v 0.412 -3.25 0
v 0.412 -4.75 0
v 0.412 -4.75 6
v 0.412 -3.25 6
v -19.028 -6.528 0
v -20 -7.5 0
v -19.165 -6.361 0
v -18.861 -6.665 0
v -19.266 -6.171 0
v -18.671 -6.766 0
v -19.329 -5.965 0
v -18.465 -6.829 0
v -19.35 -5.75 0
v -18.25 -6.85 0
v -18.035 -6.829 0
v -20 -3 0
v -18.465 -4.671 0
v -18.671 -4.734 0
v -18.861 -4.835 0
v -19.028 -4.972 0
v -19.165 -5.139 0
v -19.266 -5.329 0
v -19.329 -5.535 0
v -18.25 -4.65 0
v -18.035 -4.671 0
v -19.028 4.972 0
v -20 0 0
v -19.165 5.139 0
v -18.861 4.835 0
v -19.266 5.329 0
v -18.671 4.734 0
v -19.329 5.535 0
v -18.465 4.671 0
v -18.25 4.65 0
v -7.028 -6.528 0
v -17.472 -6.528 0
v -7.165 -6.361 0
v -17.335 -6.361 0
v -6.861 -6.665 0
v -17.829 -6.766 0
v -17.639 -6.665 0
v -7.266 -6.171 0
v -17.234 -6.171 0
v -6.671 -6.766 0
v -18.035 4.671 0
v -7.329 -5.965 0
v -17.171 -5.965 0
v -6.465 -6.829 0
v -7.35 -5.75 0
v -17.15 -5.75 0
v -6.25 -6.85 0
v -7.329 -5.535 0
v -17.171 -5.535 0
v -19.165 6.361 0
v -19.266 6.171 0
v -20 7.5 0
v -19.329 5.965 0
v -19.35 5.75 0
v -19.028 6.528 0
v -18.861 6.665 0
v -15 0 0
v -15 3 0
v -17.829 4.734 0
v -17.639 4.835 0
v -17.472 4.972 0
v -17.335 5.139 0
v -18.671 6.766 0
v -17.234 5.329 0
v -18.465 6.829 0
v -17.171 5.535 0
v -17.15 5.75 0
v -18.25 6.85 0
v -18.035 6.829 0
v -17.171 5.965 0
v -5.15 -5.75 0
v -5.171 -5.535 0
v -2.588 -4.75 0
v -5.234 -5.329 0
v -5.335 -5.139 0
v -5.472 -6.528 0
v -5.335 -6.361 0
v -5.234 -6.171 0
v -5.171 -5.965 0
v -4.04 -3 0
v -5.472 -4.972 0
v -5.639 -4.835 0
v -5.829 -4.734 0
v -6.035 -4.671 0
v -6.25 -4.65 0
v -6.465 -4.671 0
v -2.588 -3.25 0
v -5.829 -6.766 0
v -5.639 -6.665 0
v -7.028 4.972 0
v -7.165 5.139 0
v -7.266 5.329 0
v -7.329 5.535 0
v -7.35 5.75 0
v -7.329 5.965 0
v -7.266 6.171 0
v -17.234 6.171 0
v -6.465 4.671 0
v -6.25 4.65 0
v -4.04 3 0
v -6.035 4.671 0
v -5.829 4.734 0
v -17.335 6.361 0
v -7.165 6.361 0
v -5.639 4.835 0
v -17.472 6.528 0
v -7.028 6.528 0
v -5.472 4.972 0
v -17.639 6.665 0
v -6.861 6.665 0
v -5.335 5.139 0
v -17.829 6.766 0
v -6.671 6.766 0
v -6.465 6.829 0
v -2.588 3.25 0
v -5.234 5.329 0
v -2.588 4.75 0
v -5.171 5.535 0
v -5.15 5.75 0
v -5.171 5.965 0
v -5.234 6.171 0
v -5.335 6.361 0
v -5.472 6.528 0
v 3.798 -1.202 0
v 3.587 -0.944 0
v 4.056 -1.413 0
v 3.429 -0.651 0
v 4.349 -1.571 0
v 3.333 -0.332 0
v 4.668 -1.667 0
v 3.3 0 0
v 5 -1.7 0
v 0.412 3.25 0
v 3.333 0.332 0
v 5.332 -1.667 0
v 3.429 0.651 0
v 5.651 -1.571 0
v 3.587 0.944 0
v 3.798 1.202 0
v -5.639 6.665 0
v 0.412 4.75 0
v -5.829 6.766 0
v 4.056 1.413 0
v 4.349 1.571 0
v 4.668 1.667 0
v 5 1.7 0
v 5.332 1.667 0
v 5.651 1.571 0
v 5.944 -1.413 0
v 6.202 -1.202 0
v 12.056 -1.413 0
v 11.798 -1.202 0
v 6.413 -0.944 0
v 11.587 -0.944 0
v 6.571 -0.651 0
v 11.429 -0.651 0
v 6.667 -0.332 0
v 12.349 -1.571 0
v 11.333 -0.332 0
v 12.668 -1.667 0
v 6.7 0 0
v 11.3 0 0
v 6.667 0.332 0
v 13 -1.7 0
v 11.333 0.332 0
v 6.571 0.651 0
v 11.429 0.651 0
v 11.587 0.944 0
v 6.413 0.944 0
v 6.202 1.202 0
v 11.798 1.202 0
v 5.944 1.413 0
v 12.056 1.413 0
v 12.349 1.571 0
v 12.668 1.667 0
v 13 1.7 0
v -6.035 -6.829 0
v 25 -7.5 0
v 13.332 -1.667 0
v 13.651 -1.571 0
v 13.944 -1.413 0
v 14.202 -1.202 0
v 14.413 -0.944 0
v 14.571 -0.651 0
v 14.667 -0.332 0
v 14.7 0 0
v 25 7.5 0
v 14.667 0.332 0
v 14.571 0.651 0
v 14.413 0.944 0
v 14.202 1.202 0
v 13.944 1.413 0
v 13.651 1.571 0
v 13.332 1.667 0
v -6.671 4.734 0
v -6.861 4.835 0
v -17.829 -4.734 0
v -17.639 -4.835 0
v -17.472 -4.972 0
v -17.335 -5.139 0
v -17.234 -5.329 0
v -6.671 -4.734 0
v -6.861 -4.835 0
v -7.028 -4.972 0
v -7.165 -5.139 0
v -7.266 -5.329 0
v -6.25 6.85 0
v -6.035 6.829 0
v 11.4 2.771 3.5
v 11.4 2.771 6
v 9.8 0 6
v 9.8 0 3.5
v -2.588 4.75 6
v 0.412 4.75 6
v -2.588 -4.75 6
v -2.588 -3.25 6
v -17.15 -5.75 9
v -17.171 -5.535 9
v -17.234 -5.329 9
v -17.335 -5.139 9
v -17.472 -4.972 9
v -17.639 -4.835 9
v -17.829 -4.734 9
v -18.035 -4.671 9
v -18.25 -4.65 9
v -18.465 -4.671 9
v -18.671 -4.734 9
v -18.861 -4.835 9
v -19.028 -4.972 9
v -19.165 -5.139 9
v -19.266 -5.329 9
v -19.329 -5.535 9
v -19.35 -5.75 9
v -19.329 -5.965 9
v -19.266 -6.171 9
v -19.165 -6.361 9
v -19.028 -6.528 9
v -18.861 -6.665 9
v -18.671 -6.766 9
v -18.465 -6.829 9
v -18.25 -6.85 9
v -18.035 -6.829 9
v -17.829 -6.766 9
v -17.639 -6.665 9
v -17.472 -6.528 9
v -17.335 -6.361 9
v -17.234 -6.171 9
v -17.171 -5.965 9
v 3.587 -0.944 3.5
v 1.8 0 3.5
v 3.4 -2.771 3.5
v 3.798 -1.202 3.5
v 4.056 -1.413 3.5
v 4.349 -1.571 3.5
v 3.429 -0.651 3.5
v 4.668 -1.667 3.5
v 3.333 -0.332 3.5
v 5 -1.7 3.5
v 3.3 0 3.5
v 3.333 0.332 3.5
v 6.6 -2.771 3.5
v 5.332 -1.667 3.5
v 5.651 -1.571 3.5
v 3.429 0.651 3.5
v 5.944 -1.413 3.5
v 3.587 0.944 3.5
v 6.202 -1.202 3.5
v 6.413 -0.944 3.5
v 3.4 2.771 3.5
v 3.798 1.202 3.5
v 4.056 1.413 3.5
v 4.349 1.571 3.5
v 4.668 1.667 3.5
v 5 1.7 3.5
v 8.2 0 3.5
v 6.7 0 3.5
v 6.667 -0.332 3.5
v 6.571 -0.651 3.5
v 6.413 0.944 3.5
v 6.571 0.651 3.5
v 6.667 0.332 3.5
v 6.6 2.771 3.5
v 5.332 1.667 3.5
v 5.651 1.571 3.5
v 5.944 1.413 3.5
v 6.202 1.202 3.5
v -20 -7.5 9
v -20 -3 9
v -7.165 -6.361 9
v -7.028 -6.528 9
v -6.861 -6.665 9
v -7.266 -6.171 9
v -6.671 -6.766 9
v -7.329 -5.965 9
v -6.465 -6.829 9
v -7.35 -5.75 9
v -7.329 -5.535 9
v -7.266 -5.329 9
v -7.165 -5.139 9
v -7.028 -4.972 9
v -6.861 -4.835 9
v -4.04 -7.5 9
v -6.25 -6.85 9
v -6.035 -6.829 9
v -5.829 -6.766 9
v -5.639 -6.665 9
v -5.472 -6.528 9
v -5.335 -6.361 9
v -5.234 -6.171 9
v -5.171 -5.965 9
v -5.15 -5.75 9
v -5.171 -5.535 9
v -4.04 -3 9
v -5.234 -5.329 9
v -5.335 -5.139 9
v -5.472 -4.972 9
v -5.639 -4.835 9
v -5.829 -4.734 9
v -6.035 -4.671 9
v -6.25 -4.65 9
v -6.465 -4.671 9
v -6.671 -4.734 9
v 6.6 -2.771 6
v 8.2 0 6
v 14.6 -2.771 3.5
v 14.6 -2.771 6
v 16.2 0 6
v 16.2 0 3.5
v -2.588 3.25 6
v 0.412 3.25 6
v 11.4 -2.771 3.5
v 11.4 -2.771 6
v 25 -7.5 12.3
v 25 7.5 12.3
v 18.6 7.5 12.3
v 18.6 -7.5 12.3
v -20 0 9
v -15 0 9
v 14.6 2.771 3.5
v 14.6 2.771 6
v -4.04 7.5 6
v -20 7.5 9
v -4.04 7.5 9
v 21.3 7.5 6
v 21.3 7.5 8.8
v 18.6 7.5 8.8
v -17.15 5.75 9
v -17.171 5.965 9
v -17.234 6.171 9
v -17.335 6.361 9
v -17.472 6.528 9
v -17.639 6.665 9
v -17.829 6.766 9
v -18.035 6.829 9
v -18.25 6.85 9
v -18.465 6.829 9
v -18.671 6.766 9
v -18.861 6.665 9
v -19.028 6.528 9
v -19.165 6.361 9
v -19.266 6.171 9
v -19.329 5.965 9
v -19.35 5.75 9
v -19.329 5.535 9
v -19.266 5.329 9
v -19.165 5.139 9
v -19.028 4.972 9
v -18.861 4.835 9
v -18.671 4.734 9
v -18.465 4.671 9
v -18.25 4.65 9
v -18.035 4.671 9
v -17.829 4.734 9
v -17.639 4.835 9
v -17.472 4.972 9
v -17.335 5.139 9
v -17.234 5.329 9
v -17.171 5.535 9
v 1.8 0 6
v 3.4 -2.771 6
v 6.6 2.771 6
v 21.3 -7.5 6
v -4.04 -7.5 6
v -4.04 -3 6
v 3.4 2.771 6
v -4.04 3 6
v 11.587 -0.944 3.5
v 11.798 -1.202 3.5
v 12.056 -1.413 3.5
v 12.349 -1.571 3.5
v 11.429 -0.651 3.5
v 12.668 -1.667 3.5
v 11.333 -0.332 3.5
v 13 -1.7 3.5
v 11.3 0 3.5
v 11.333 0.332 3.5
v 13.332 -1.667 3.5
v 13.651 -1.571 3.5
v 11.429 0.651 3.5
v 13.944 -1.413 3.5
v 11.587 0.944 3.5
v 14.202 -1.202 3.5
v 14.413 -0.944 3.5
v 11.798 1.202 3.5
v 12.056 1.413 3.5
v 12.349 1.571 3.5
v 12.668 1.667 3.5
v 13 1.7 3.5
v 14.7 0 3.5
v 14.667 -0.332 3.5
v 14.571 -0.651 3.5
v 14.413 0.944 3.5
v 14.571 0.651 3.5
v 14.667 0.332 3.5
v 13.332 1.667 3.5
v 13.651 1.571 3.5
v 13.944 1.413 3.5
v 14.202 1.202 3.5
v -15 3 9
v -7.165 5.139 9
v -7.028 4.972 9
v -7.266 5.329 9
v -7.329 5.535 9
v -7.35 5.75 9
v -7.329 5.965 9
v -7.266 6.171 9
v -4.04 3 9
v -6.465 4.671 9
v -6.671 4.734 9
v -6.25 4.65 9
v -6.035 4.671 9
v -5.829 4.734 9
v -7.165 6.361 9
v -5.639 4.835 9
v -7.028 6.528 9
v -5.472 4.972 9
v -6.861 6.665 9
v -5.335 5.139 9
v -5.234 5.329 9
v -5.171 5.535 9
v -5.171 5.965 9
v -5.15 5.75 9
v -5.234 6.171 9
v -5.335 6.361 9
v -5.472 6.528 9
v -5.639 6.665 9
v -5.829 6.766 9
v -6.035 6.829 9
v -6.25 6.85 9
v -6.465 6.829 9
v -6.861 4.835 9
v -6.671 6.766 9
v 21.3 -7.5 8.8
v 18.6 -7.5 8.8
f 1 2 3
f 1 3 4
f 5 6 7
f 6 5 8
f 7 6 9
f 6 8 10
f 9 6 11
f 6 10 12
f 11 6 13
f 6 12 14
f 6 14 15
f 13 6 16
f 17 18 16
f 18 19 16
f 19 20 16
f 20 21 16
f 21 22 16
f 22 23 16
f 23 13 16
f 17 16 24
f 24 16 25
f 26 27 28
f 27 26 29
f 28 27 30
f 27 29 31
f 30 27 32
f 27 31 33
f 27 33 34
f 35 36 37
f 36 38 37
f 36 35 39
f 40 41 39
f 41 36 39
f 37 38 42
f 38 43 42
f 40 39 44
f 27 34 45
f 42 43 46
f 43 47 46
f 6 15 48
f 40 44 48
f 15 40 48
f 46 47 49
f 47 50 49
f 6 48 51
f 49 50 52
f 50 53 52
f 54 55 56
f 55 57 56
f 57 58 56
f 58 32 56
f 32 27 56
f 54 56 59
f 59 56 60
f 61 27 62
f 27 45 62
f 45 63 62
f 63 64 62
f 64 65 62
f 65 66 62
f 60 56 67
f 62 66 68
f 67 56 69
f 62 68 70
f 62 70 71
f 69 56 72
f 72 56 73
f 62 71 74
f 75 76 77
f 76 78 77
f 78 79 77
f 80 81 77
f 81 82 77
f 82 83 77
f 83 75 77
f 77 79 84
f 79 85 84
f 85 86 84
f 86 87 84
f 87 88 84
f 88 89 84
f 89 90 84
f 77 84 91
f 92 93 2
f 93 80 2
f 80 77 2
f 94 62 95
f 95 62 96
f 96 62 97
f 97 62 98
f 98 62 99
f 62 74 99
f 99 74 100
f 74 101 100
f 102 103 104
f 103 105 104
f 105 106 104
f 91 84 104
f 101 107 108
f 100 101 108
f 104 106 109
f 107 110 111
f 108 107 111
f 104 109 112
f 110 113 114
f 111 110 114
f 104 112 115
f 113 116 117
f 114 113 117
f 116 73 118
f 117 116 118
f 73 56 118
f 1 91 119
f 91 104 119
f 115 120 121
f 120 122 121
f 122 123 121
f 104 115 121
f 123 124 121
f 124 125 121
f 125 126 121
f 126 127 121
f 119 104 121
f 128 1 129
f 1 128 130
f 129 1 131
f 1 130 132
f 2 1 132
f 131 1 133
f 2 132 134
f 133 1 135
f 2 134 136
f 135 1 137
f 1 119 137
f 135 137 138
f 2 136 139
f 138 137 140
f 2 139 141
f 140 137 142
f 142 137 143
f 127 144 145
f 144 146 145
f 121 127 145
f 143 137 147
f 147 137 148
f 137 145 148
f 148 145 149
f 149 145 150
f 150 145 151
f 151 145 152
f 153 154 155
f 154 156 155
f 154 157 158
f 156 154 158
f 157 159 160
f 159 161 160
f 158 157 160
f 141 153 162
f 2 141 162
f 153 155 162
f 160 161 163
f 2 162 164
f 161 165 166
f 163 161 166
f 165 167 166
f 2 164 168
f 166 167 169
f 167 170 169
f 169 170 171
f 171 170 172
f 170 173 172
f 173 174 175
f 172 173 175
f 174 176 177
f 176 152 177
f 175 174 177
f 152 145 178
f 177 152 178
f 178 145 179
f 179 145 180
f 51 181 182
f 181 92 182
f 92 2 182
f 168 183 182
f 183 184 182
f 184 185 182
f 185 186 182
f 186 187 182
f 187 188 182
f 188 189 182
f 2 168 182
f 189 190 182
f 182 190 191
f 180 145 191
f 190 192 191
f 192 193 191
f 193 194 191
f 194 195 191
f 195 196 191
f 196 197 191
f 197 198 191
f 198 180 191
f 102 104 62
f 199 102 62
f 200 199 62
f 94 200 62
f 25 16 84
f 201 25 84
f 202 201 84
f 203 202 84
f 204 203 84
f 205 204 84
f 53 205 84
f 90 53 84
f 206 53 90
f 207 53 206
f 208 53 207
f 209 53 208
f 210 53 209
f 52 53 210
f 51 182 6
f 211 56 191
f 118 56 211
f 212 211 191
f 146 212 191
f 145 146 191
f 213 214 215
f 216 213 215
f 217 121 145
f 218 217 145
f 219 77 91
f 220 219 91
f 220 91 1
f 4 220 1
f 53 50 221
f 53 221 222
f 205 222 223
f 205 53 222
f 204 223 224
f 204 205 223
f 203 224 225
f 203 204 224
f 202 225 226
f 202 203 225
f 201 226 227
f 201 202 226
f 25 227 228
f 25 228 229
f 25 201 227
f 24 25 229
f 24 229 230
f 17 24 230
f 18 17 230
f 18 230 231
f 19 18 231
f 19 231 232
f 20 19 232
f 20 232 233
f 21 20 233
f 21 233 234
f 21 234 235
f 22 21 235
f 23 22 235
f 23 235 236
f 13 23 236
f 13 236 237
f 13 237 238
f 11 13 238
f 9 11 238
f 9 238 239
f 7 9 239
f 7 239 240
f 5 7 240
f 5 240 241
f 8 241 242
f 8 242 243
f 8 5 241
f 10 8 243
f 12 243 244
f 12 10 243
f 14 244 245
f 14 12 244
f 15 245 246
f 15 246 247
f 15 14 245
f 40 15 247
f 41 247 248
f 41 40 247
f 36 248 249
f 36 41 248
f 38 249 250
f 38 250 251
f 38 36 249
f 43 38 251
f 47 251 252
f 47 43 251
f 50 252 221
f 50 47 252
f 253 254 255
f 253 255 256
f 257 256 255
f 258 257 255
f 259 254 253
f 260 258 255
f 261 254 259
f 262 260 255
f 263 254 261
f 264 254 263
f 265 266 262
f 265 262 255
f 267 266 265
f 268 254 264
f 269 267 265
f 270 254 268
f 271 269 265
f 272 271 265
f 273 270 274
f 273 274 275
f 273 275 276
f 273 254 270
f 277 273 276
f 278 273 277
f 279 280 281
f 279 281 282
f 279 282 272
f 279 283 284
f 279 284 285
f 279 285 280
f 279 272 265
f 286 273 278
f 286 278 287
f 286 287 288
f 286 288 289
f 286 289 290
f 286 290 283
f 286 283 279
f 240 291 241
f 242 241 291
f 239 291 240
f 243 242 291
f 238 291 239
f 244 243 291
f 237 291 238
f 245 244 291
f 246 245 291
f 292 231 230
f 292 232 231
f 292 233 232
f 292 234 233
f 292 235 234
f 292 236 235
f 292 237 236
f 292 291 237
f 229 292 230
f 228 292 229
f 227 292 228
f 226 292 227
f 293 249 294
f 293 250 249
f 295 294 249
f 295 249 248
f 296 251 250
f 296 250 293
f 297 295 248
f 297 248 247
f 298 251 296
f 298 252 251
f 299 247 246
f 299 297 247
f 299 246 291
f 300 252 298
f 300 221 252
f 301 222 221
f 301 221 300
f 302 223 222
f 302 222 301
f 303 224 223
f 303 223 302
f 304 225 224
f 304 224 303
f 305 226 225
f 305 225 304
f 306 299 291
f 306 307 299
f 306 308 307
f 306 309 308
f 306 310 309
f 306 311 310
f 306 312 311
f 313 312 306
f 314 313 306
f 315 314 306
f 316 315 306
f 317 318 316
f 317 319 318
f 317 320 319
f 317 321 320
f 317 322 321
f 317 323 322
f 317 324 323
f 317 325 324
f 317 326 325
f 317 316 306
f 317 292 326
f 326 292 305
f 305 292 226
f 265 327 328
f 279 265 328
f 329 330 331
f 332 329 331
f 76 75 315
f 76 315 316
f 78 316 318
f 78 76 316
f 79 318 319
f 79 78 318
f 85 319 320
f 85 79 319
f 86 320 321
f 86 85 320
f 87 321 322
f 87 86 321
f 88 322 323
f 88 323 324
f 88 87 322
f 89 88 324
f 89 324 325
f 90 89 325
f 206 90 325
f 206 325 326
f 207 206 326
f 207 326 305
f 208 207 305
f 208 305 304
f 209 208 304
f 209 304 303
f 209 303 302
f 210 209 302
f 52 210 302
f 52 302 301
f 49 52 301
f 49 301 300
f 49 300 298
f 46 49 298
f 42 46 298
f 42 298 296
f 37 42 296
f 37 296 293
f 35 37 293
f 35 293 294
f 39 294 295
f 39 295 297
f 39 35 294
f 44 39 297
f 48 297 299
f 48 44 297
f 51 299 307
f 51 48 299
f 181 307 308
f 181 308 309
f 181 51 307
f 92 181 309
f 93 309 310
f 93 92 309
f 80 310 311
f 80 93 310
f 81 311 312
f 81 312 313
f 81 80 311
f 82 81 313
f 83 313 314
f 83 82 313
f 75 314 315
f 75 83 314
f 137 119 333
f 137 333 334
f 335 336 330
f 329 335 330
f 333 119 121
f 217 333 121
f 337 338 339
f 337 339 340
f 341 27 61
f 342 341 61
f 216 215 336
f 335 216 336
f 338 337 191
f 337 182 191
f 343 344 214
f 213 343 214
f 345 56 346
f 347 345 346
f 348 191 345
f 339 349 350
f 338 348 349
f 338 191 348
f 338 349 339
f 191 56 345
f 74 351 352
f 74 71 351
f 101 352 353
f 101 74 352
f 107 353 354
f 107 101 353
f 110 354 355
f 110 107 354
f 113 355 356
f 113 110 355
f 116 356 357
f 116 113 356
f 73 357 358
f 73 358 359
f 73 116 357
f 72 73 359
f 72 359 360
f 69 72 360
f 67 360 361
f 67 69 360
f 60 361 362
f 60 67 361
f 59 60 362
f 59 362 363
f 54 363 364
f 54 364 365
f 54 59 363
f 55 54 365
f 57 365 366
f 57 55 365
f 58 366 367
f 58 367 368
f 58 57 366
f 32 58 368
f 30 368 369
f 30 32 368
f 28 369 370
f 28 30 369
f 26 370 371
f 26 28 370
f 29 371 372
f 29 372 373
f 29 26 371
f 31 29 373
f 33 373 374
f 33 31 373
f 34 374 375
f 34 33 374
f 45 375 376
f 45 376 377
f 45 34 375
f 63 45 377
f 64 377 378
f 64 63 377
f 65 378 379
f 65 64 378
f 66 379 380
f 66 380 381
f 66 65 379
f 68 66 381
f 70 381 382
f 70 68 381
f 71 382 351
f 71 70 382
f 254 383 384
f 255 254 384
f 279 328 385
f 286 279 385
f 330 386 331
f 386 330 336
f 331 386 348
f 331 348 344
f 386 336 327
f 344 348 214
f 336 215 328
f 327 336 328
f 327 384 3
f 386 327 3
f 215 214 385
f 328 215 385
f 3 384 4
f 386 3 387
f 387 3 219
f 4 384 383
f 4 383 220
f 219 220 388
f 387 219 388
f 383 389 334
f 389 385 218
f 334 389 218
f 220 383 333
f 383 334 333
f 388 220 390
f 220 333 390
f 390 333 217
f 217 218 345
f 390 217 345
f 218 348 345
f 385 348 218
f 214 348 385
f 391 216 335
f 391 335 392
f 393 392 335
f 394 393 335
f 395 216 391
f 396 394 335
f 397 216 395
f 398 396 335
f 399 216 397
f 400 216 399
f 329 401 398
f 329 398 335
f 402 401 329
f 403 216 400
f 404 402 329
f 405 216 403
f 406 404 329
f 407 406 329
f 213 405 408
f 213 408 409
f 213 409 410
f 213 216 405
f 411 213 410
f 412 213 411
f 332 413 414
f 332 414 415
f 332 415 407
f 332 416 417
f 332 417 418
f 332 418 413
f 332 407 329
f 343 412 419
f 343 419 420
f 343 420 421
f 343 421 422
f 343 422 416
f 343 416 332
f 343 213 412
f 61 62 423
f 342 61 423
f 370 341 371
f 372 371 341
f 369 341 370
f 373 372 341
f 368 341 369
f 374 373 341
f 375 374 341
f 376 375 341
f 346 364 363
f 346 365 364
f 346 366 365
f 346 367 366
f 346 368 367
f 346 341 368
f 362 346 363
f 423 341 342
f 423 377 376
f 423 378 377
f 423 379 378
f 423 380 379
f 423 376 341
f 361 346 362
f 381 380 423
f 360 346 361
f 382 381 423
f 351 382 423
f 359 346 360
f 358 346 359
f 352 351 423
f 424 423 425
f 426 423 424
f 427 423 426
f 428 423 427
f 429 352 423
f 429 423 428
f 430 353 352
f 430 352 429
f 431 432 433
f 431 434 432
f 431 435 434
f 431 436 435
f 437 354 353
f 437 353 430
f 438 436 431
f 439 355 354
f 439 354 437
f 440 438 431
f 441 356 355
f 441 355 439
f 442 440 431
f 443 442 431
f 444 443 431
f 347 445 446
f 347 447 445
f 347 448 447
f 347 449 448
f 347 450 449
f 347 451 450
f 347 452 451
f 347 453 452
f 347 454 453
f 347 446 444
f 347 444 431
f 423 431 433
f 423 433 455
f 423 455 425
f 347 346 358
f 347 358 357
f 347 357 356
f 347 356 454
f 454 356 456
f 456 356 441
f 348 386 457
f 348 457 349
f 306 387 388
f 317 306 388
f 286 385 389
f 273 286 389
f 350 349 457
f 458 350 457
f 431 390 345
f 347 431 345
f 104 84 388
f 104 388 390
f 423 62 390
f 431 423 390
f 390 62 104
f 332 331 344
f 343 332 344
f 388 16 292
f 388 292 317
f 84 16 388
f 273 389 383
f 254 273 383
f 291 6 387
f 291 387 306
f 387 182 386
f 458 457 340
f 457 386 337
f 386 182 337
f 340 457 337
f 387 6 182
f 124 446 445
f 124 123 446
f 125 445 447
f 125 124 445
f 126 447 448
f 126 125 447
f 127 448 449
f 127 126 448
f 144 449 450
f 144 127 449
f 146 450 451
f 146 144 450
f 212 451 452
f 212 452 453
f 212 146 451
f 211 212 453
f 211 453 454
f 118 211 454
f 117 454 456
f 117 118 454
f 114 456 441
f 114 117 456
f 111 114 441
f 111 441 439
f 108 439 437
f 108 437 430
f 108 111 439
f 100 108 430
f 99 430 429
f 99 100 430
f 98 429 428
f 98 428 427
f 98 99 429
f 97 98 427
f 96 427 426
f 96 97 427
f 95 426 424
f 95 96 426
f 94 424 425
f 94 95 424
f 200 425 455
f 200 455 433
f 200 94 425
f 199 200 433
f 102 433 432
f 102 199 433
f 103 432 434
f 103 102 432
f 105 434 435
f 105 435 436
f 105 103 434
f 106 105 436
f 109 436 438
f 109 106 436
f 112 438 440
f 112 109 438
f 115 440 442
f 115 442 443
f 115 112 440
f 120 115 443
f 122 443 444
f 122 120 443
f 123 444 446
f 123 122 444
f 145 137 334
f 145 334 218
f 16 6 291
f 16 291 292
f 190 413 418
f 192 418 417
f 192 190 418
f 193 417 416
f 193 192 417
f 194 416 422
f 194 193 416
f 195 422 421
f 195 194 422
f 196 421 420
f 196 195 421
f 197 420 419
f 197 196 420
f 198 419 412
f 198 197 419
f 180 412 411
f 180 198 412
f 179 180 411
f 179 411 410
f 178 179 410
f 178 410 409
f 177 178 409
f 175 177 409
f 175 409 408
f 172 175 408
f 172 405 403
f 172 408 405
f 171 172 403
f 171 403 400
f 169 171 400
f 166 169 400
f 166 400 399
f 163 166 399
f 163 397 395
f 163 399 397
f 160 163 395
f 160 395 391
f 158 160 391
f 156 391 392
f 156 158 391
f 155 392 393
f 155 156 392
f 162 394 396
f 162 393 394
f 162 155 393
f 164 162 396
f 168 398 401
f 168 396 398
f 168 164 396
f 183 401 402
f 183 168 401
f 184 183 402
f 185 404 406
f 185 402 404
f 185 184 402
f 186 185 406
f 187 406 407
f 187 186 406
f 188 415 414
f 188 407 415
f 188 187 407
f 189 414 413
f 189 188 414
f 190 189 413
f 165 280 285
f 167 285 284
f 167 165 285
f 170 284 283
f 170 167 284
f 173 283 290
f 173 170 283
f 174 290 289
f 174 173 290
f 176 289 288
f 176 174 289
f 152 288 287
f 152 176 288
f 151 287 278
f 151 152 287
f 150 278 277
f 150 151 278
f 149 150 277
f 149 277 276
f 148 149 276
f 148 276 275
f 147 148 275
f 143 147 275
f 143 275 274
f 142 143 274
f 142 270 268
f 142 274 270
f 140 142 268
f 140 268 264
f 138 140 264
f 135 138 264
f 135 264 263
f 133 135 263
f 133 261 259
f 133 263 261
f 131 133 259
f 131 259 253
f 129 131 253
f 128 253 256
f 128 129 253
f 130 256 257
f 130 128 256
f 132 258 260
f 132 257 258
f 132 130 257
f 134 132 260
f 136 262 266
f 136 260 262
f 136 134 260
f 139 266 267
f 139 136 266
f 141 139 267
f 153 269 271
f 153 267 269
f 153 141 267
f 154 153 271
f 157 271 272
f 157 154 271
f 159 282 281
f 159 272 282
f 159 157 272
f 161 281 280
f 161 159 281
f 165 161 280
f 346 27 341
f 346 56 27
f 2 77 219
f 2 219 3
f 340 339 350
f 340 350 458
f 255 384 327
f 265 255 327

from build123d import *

# Parameters (mm, degrees)
SKETCH_R     = 1.7
SKETCH_R_2   = 1.1
SKETCH_W     = 3
SKETCH_H     = 1.5
PAD_DEPTH    = 6
POCKET_DEPTH = 2.5
SKETCH002_W  = 15.96
SKETCH002_H  = 4.5
SKETCH002_R  = 1.1
PAD001_DEPTH = 3
SKETCH003_W  = 3.7
SKETCH003_H  = 15
PAD002_DEPTH = 6.3
SKETCH004_W  = 15
SKETCH004_H  = 3.5
PAD003_DEPTH = 2.7
SKETCH005_W  = 5
SKETCH005_H  = 9
PAD004_DEPTH = 3


with BuildPart() as part:
    # Sketch → Pad (new body)
    with BuildSketch(Plane.XY):
        Polygon((-20, 7.5), (25, 7.5), (25, -7.5), (-20, -7.5), (-20, -3), (-4.04, -3), (-4.04, 3), (-20, 3), align=None)
        with Locations((5, 0)):
            Circle(SKETCH_R, mode=Mode.SUBTRACT)
        with Locations((13, 0)):
            Circle(SKETCH_R, mode=Mode.SUBTRACT)
        with Locations((-18.25, 5.75)):
            Circle(SKETCH_R_2, mode=Mode.SUBTRACT)
        with Locations((-6.25, 5.75)):
            Circle(SKETCH_R_2, mode=Mode.SUBTRACT)
        with Locations((-18.25, -5.75)):
            Circle(SKETCH_R_2, mode=Mode.SUBTRACT)
        with Locations((-6.25, -5.75)):
            Circle(SKETCH_R_2, mode=Mode.SUBTRACT)
        with Locations((-1.087833, 4)):
            Rectangle(SKETCH_W, SKETCH_H, mode=Mode.SUBTRACT)
        with Locations((-1.087833, -4)):
            Rectangle(SKETCH_W, SKETCH_H, mode=Mode.SUBTRACT)
    extrude(amount=PAD_DEPTH)

    # Sketch001 (on Face24 of Pad) → Pocket (cut)
    with BuildSketch(Plane.XY.offset(6)):
        Polygon((6.6, -2.771281), (8.2, 0), (6.6, 2.771281), (3.4, 2.771281), (1.8, 0), (3.4, -2.771281), align=None)
        Polygon((14.6, -2.771281), (16.2, 0), (14.6, 2.771281), (11.4, 2.771281), (9.8, 0), (11.4, -2.771281), align=None)
    extrude(amount=-POCKET_DEPTH, mode=Mode.SUBTRACT)

    # Sketch002 (on Face5 of Pocket) → Pad001 (join)
    with BuildSketch(Plane.XY.offset(6)):
        with Locations((-12.02, 5.25)):
            Rectangle(SKETCH002_W, SKETCH002_H)
        with Locations((-18.25, 5.75)):
            Circle(SKETCH002_R, mode=Mode.SUBTRACT)
        with Locations((-6.25, 5.75)):
            Circle(SKETCH002_R, mode=Mode.SUBTRACT)
        with Locations((-12.02, -5.25)):
            Rectangle(SKETCH002_W, SKETCH002_H)
        with Locations((-18.25, -5.75)):
            Circle(SKETCH002_R, mode=Mode.SUBTRACT)
        with Locations((-6.25, -5.75)):
            Circle(SKETCH002_R, mode=Mode.SUBTRACT)
    extrude(amount=PAD001_DEPTH)

    # Sketch003 (on Face8 of Pad001) → Pad002 (join)
    with BuildSketch(Plane.XY.offset(6)):
        with Locations((23.15, 0)):
            Rectangle(SKETCH003_W, SKETCH003_H)
    extrude(amount=PAD002_DEPTH)

    # Sketch004 (on Face33 of Pad002) → Pad003 (join)
    with BuildSketch(Plane(origin=(21.3, 0, 0), x_dir=(0, -1, 0), z_dir=(-1, 0, 0))):
        with Locations((0, 10.55)):
            Rectangle(SKETCH004_W, SKETCH004_H)
    extrude(amount=PAD003_DEPTH)

    # Sketch005 (on Face3 of Pad003) → Pad004 (join)
    with BuildSketch(Plane.XZ.offset(-3)):
        with Locations((-17.5, 4.5)):
            Rectangle(SKETCH005_W, SKETCH005_H)
    extrude(amount=PAD004_DEPTH)


solid = part.part
